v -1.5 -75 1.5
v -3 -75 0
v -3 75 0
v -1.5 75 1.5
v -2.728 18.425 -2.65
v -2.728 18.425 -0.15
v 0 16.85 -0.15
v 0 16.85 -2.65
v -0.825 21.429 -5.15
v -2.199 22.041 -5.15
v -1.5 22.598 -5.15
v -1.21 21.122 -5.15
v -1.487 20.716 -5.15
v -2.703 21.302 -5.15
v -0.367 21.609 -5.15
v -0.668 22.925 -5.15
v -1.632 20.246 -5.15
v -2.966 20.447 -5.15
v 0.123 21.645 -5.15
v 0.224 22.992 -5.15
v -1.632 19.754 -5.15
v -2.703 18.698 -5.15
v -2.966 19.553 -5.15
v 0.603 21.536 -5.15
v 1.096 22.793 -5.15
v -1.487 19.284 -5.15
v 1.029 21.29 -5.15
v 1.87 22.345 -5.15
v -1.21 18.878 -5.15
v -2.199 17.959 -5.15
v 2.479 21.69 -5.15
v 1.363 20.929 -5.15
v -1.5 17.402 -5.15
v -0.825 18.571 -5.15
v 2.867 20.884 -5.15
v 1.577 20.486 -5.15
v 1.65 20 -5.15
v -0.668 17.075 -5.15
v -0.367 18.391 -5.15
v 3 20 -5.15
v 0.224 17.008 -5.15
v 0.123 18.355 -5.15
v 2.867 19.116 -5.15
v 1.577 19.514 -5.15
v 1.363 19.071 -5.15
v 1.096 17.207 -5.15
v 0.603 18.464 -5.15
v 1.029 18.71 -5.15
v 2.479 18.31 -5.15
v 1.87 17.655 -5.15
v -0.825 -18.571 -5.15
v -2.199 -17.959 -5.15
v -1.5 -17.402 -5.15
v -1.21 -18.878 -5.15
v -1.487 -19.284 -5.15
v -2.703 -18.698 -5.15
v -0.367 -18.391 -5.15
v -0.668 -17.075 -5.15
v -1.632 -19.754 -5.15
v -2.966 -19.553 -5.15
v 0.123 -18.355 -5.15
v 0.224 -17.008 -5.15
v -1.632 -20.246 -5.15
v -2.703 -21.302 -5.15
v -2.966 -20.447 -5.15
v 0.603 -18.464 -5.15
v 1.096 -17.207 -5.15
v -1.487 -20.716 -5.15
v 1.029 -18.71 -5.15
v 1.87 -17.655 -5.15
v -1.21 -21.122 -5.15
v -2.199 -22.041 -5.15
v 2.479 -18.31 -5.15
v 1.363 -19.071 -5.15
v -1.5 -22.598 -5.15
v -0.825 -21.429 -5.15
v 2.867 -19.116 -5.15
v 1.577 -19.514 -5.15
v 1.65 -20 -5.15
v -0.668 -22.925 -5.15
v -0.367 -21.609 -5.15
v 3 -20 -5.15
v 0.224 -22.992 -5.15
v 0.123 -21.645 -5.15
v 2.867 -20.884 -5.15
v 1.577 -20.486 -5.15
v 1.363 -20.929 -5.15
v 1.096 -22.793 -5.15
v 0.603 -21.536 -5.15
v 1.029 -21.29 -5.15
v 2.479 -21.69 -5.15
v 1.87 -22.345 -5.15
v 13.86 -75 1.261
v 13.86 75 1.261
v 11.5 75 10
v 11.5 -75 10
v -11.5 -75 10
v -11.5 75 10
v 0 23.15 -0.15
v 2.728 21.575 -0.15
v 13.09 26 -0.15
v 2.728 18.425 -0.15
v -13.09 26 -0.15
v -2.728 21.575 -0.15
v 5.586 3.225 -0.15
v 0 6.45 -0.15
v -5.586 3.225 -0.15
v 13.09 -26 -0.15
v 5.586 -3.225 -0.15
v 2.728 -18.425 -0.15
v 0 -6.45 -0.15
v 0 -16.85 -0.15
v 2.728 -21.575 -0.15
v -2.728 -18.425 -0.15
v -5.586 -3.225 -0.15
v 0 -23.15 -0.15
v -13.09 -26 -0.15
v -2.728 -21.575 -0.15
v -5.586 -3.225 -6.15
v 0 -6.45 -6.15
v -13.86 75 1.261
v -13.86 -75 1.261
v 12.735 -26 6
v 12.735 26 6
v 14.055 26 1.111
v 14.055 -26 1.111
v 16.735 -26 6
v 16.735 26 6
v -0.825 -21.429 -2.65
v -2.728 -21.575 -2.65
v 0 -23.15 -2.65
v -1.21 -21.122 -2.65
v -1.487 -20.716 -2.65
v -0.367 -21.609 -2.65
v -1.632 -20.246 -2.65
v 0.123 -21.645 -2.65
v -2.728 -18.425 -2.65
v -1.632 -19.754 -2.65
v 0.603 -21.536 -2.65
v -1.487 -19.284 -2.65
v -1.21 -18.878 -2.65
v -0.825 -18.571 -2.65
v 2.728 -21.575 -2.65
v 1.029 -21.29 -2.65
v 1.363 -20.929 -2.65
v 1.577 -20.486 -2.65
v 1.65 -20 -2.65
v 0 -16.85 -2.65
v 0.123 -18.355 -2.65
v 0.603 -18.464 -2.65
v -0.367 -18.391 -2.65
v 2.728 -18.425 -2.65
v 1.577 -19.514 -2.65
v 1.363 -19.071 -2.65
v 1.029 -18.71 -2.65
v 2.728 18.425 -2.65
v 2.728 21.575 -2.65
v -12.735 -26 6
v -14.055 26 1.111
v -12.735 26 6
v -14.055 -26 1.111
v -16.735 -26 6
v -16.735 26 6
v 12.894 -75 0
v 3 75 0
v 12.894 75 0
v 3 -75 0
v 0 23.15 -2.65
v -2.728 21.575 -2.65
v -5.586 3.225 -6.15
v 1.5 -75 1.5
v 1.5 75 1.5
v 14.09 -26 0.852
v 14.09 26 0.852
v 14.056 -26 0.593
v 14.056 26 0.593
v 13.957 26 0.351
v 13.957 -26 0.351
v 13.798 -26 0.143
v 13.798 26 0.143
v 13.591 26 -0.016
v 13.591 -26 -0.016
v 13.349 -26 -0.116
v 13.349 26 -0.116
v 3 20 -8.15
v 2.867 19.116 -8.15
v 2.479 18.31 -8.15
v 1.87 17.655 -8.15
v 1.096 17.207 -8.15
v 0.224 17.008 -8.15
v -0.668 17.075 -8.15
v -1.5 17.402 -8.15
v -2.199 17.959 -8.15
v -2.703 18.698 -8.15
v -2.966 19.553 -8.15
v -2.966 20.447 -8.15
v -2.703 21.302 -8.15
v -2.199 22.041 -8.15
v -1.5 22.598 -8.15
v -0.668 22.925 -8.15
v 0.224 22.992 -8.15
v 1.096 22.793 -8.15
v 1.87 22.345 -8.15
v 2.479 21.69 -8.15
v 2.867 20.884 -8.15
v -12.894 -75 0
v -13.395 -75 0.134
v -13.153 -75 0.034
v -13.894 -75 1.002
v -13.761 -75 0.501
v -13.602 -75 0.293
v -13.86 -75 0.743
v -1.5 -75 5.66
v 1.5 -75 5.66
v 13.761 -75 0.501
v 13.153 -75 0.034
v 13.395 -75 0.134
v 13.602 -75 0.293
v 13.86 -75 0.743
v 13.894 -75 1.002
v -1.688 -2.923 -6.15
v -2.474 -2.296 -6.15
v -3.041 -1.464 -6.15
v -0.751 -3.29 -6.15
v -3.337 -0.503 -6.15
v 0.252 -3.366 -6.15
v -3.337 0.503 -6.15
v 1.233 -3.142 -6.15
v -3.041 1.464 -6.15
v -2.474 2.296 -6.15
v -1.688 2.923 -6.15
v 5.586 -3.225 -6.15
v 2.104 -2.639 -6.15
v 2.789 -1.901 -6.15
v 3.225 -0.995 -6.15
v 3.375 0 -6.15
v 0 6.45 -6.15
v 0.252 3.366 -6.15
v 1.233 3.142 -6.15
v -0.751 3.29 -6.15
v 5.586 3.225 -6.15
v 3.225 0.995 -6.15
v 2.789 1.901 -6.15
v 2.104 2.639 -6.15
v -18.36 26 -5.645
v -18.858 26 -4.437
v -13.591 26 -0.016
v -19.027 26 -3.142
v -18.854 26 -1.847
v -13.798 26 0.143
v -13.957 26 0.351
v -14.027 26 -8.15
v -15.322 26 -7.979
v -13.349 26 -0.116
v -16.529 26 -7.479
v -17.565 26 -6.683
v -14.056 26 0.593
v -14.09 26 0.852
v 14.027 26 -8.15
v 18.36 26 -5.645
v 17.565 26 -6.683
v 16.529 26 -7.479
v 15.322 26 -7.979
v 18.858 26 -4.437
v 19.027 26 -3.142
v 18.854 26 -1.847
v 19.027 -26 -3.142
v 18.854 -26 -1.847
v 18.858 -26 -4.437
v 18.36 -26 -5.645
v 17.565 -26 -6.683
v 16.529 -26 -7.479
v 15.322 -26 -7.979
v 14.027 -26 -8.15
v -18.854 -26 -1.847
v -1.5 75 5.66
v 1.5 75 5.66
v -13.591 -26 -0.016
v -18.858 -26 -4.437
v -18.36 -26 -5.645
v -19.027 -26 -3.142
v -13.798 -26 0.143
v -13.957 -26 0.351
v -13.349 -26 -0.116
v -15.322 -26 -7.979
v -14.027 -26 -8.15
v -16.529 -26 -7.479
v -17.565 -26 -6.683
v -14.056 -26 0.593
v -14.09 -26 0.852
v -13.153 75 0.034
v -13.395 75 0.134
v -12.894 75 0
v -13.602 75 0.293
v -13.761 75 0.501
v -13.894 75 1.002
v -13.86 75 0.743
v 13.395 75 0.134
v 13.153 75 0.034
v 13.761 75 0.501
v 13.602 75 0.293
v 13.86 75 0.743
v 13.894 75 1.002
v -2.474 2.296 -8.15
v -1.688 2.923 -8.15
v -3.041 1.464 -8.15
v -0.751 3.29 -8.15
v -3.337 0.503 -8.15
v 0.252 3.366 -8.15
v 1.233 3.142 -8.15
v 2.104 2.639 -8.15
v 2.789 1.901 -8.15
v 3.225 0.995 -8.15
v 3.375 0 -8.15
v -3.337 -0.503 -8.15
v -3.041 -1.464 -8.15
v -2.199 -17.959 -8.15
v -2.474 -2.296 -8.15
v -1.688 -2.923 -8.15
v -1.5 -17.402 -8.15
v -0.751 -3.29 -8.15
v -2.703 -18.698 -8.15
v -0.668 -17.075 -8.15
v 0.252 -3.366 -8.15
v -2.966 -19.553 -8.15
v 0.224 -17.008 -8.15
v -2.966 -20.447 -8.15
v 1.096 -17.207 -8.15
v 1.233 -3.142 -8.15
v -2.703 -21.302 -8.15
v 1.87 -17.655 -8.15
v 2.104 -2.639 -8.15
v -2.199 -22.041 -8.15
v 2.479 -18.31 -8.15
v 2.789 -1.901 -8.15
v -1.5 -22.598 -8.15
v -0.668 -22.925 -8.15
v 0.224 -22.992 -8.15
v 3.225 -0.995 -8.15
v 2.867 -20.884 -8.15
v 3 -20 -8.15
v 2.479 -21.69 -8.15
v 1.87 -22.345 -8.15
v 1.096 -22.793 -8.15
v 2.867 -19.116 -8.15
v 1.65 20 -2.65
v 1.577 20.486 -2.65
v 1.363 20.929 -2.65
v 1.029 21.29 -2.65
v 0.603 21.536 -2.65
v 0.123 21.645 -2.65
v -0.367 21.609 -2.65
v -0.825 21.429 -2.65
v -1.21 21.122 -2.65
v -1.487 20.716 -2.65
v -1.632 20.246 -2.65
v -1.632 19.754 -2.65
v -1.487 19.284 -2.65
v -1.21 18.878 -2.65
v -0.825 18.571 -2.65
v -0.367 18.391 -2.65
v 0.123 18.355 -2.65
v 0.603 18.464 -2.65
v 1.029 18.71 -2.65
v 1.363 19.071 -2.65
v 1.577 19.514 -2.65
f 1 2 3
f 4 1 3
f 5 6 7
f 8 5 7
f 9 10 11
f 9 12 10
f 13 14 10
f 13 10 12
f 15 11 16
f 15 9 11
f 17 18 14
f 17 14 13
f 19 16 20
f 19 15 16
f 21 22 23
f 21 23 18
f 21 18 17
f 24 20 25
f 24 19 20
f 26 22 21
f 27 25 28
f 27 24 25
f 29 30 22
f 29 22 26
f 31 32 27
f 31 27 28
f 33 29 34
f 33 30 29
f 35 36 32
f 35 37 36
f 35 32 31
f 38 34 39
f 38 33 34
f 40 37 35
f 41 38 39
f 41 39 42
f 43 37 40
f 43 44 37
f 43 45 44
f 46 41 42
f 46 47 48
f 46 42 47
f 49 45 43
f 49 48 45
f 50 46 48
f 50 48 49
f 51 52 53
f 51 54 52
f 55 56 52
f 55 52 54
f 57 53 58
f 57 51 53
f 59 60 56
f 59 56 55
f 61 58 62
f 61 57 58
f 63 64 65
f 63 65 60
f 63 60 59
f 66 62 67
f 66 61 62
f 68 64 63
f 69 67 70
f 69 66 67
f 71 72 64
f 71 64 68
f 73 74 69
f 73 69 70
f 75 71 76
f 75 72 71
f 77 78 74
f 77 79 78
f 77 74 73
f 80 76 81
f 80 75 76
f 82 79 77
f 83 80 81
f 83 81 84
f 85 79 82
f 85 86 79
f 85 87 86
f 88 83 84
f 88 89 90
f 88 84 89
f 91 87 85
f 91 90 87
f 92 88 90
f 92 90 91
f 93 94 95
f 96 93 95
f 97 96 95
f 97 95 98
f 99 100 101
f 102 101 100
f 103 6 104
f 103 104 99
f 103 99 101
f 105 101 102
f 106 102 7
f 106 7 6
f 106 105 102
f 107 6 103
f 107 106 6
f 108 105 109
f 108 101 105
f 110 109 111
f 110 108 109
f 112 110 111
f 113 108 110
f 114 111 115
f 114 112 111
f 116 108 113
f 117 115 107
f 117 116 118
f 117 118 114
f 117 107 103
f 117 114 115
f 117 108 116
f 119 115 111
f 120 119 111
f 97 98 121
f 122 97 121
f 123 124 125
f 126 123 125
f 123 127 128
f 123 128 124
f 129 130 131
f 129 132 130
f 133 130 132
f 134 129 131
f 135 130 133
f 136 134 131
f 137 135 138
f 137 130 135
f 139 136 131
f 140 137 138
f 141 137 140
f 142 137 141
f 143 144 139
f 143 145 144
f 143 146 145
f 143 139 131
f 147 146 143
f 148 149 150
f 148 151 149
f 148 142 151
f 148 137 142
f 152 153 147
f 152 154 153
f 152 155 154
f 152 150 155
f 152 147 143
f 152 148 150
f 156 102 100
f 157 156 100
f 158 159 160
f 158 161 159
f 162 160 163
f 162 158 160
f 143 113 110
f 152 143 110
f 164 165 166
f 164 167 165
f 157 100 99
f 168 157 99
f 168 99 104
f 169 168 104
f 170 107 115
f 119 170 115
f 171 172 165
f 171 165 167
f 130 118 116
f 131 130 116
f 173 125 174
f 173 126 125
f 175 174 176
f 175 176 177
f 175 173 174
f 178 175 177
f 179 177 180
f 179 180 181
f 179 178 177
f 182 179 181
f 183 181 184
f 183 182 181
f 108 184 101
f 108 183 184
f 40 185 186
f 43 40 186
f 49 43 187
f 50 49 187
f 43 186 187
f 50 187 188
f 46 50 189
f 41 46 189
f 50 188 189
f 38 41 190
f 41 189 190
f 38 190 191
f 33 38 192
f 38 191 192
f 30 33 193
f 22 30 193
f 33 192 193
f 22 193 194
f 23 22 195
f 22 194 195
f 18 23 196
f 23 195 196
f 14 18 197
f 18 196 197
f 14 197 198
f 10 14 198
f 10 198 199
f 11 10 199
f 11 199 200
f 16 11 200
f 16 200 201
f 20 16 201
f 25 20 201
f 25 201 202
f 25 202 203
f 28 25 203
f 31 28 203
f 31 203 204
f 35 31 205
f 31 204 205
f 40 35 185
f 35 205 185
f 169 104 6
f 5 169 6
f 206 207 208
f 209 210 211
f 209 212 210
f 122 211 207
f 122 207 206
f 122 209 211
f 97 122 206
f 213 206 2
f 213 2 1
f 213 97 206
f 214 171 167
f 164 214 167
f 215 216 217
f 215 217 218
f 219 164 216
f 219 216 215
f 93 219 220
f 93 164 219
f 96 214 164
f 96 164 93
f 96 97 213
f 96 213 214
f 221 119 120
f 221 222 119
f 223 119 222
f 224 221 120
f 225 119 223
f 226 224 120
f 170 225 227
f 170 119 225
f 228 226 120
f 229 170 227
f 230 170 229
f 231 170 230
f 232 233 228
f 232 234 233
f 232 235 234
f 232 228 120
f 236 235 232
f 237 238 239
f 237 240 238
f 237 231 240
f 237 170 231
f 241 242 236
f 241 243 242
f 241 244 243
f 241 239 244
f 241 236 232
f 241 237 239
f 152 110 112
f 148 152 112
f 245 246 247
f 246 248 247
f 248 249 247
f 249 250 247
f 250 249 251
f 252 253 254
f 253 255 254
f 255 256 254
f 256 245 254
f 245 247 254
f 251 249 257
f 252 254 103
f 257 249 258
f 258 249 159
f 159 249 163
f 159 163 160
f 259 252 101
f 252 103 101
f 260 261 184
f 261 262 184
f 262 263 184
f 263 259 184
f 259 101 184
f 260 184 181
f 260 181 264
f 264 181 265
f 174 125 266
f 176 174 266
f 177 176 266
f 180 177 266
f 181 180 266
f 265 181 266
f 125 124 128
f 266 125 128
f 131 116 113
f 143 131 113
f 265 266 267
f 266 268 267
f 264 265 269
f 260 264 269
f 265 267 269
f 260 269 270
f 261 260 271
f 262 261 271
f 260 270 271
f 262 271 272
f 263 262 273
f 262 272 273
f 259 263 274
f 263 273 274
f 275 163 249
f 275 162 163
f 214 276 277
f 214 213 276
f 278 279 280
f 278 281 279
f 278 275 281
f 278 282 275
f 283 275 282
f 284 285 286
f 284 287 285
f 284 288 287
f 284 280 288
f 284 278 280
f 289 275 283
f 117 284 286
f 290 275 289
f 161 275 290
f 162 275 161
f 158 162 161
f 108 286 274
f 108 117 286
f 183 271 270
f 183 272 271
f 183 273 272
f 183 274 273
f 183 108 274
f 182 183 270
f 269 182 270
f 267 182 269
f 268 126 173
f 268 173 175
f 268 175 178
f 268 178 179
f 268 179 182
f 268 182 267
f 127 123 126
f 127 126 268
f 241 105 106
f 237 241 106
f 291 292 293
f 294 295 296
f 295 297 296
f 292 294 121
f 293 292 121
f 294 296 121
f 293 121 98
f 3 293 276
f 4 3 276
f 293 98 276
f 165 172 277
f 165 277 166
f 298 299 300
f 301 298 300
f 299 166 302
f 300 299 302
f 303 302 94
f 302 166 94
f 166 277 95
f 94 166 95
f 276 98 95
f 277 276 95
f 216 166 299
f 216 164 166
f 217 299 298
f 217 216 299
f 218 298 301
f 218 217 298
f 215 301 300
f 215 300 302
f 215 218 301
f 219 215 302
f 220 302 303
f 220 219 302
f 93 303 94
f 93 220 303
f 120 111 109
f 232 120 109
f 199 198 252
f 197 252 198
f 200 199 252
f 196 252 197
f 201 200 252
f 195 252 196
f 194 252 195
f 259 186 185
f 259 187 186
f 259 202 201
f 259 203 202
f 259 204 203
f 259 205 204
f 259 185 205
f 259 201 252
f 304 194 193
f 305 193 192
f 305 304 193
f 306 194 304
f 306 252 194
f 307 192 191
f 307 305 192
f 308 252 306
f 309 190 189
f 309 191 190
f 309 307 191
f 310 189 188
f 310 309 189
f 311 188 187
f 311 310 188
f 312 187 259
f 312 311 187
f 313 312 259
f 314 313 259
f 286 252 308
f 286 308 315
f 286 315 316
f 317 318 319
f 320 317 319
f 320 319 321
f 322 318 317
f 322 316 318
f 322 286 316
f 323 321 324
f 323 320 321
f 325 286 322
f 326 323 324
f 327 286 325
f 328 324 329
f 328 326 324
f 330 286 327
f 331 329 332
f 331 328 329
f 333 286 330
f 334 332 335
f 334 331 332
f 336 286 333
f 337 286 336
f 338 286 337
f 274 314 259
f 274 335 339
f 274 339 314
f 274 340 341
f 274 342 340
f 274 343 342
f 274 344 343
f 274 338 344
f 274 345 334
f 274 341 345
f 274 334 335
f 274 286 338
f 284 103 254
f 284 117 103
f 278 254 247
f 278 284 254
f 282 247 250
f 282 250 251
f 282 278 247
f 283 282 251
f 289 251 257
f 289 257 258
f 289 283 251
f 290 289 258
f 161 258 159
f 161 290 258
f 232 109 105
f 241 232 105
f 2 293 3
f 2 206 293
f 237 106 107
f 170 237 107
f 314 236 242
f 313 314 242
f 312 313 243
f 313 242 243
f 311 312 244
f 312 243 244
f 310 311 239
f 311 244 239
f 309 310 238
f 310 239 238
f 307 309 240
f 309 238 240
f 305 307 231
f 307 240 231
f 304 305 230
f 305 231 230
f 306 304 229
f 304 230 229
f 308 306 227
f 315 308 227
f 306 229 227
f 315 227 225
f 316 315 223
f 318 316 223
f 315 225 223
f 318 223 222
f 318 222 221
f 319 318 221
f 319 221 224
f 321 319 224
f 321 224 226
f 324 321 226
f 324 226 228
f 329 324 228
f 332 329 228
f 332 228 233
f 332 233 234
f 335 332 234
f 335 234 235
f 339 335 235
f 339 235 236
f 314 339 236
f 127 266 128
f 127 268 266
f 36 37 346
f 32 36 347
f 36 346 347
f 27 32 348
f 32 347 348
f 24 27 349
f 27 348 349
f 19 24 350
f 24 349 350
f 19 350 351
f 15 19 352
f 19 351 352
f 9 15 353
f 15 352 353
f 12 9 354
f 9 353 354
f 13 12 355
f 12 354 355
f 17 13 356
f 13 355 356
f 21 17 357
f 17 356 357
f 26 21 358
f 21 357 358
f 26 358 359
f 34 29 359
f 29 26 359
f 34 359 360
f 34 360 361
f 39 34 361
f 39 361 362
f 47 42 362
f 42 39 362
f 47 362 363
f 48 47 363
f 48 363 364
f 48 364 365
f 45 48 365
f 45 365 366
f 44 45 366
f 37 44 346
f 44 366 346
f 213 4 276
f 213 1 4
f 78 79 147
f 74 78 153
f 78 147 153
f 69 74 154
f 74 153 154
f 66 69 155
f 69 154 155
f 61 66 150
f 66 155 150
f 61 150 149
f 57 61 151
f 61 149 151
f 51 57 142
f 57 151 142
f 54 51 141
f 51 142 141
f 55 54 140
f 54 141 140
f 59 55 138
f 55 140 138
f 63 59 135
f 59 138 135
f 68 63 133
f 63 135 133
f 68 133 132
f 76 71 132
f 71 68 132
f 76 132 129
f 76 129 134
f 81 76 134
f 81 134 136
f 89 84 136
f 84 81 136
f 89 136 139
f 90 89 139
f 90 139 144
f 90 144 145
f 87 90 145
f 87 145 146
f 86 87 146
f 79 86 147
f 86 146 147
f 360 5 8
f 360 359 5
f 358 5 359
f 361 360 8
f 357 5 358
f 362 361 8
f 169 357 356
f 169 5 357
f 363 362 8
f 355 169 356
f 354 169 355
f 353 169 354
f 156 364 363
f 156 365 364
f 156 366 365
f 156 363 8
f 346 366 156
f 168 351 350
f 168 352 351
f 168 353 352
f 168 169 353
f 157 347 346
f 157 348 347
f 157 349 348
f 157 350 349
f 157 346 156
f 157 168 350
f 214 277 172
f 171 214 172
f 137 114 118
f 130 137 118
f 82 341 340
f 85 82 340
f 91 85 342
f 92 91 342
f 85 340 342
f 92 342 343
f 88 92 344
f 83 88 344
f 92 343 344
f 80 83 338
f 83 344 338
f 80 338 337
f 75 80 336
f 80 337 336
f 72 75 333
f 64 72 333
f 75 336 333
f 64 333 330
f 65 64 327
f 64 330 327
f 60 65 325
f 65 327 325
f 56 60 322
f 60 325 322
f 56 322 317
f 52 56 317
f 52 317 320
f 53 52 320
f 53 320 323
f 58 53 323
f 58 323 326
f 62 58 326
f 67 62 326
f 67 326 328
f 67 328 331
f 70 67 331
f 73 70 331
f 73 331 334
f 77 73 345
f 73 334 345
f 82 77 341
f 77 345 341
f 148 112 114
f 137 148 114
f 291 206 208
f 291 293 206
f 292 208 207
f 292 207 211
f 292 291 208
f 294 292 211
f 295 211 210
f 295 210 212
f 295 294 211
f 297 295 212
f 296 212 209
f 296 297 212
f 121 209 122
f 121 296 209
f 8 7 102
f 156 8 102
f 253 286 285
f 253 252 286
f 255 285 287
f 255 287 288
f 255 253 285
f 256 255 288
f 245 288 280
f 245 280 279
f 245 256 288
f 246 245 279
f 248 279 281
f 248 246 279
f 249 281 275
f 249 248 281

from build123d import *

# Parameters (mm, degrees)
F1_DEPTH  = 75
F2_DEPTH  = 26
F3_R      = 3.375
F3_R_2    = 1.65
F4_DEPTH  = 8.001
F5_DEPTH  = 6
F6_SIZE   = 1.5
F7_R      = 1
F7_2_R    = 1
F8_R      = 5
F9_R      = 3
F9_R_2    = 1.65
F10_DEPTH = 3
F11_DEPTH = 2.5


with BuildPart() as f1:
    # F0 (on Front) → F1 (new body, symmetric)
    with BuildSketch(Plane.XZ):
        Polygon((-1.5, 5.66), (0, 5.66), (1.5, 5.66), (1.5, 0), (14.2, 0), (11.5, 10), (0, 10), (-11.5, 10), (-14.2, 0), (-1.5, 0), align=None)
    extrude(amount=F1_DEPTH, both=True)

    # F6
    f6_edges = [f1.edges().sort_by_distance(p)[0] for p in [
        (-1.5, 0, 0),
        (1.5, 0, 0),
    ]]
    chamfer(f6_edges, length=F6_SIZE)

    # F7
    f7_edges = [f1.edges().sort_by_distance(p)[0] for p in [
        (14.2, 0, 0),
        (-14.2, 0, 0),
    ]]
    fillet(f7_edges, radius=F7_R)


with BuildPart() as f2:
    # F0 (on Front) → F2 (new body, symmetric)
    with BuildSketch(Plane.XZ):
        Polygon((-20.5558713294, -8.15), (0, -8.15), (20.5558713294, -8.15), (16.7353713294, 6), (12.7353713294, 6), (14.3958713294, -0.15), (2.0723198541, -0.15), (0, -0.15), (-2.0723198541, -0.15), (-14.3958713294, -0.15), (-12.7353713294, 6), (-16.7353713294, 6), align=None)
    extrude(amount=F2_DEPTH, both=True)

    # F3 (on face) → F4 (cut, through all)
    with BuildSketch(Plane.XY.offset(-0.15)):
        Circle(F3_R)
        with Locations((0, 20)):
            Circle(F3_R_2)
        with Locations((0, -20)):
            Circle(F3_R_2)
    extrude(amount=-F4_DEPTH, mode=Mode.SUBTRACT)

    # F3 (on face) → F5 (cut)
    with BuildSketch(Plane.XY.offset(-0.15)):
        Polygon((0, -6.45), (5.5858638544, -3.225), (5.5858638544, 3.225), (0, 6.45), (-5.5858638544, 3.225), (-5.5858638544, -3.225), align=None)
        Circle(F3_R, mode=Mode.SUBTRACT)
    extrude(amount=-F5_DEPTH, mode=Mode.SUBTRACT)

    # F7#2
    f7_2_edges = [f2.edges().sort_by_distance(p)[0] for p in [
        (-14.395871, 0, -0.15),
        (14.395871, 0, -0.15),
    ]]
    fillet(f7_2_edges, radius=F7_2_R)

    # F8
    f8_edges = [f2.edges().sort_by_distance(p)[0] for p in [
        (-20.555871, 0, -8.15),
        (20.555871, 0, -8.15),
    ]]
    fillet(f8_edges, radius=F8_R)

    # F9 (on face) → F10 (cut)
    with BuildSketch(Plane(origin=(0, 0, -8.15), x_dir=(1, 0, 0), z_dir=(0, 0, -1))):
        with Locations((0, 20)):
            Circle(F9_R)
        with Locations((0, 20)):
            Circle(F9_R_2, mode=Mode.SUBTRACT)
        with Locations((0, -20)):
            Circle(F9_R)
        with Locations((0, -20)):
            Circle(F9_R_2, mode=Mode.SUBTRACT)
    extrude(amount=-F10_DEPTH, mode=Mode.SUBTRACT)

    # F3 (on face) → F11 (cut)
    with BuildSketch(Plane.XY.offset(-0.15)):
        Polygon((2.7279800219, 21.575), (0, 23.15), (-2.7279800219, 21.575), (-2.7279800219, 18.425), (0, 16.85), (2.7279800219, 18.425), align=None)
        with Locations((0, 20)):
            Circle(F3_R_2, mode=Mode.SUBTRACT)
        Polygon((2.7279800219, -21.575), (2.7279800219, -18.425), (0, -16.85), (-2.7279800219, -18.425), (-2.7279800219, -21.575), (0, -23.15), align=None)
        with Locations((0, -20)):
            Circle(F3_R_2, mode=Mode.SUBTRACT)
    extrude(amount=-F11_DEPTH, mode=Mode.SUBTRACT)


solid = Compound([f1.part, f2.part])
